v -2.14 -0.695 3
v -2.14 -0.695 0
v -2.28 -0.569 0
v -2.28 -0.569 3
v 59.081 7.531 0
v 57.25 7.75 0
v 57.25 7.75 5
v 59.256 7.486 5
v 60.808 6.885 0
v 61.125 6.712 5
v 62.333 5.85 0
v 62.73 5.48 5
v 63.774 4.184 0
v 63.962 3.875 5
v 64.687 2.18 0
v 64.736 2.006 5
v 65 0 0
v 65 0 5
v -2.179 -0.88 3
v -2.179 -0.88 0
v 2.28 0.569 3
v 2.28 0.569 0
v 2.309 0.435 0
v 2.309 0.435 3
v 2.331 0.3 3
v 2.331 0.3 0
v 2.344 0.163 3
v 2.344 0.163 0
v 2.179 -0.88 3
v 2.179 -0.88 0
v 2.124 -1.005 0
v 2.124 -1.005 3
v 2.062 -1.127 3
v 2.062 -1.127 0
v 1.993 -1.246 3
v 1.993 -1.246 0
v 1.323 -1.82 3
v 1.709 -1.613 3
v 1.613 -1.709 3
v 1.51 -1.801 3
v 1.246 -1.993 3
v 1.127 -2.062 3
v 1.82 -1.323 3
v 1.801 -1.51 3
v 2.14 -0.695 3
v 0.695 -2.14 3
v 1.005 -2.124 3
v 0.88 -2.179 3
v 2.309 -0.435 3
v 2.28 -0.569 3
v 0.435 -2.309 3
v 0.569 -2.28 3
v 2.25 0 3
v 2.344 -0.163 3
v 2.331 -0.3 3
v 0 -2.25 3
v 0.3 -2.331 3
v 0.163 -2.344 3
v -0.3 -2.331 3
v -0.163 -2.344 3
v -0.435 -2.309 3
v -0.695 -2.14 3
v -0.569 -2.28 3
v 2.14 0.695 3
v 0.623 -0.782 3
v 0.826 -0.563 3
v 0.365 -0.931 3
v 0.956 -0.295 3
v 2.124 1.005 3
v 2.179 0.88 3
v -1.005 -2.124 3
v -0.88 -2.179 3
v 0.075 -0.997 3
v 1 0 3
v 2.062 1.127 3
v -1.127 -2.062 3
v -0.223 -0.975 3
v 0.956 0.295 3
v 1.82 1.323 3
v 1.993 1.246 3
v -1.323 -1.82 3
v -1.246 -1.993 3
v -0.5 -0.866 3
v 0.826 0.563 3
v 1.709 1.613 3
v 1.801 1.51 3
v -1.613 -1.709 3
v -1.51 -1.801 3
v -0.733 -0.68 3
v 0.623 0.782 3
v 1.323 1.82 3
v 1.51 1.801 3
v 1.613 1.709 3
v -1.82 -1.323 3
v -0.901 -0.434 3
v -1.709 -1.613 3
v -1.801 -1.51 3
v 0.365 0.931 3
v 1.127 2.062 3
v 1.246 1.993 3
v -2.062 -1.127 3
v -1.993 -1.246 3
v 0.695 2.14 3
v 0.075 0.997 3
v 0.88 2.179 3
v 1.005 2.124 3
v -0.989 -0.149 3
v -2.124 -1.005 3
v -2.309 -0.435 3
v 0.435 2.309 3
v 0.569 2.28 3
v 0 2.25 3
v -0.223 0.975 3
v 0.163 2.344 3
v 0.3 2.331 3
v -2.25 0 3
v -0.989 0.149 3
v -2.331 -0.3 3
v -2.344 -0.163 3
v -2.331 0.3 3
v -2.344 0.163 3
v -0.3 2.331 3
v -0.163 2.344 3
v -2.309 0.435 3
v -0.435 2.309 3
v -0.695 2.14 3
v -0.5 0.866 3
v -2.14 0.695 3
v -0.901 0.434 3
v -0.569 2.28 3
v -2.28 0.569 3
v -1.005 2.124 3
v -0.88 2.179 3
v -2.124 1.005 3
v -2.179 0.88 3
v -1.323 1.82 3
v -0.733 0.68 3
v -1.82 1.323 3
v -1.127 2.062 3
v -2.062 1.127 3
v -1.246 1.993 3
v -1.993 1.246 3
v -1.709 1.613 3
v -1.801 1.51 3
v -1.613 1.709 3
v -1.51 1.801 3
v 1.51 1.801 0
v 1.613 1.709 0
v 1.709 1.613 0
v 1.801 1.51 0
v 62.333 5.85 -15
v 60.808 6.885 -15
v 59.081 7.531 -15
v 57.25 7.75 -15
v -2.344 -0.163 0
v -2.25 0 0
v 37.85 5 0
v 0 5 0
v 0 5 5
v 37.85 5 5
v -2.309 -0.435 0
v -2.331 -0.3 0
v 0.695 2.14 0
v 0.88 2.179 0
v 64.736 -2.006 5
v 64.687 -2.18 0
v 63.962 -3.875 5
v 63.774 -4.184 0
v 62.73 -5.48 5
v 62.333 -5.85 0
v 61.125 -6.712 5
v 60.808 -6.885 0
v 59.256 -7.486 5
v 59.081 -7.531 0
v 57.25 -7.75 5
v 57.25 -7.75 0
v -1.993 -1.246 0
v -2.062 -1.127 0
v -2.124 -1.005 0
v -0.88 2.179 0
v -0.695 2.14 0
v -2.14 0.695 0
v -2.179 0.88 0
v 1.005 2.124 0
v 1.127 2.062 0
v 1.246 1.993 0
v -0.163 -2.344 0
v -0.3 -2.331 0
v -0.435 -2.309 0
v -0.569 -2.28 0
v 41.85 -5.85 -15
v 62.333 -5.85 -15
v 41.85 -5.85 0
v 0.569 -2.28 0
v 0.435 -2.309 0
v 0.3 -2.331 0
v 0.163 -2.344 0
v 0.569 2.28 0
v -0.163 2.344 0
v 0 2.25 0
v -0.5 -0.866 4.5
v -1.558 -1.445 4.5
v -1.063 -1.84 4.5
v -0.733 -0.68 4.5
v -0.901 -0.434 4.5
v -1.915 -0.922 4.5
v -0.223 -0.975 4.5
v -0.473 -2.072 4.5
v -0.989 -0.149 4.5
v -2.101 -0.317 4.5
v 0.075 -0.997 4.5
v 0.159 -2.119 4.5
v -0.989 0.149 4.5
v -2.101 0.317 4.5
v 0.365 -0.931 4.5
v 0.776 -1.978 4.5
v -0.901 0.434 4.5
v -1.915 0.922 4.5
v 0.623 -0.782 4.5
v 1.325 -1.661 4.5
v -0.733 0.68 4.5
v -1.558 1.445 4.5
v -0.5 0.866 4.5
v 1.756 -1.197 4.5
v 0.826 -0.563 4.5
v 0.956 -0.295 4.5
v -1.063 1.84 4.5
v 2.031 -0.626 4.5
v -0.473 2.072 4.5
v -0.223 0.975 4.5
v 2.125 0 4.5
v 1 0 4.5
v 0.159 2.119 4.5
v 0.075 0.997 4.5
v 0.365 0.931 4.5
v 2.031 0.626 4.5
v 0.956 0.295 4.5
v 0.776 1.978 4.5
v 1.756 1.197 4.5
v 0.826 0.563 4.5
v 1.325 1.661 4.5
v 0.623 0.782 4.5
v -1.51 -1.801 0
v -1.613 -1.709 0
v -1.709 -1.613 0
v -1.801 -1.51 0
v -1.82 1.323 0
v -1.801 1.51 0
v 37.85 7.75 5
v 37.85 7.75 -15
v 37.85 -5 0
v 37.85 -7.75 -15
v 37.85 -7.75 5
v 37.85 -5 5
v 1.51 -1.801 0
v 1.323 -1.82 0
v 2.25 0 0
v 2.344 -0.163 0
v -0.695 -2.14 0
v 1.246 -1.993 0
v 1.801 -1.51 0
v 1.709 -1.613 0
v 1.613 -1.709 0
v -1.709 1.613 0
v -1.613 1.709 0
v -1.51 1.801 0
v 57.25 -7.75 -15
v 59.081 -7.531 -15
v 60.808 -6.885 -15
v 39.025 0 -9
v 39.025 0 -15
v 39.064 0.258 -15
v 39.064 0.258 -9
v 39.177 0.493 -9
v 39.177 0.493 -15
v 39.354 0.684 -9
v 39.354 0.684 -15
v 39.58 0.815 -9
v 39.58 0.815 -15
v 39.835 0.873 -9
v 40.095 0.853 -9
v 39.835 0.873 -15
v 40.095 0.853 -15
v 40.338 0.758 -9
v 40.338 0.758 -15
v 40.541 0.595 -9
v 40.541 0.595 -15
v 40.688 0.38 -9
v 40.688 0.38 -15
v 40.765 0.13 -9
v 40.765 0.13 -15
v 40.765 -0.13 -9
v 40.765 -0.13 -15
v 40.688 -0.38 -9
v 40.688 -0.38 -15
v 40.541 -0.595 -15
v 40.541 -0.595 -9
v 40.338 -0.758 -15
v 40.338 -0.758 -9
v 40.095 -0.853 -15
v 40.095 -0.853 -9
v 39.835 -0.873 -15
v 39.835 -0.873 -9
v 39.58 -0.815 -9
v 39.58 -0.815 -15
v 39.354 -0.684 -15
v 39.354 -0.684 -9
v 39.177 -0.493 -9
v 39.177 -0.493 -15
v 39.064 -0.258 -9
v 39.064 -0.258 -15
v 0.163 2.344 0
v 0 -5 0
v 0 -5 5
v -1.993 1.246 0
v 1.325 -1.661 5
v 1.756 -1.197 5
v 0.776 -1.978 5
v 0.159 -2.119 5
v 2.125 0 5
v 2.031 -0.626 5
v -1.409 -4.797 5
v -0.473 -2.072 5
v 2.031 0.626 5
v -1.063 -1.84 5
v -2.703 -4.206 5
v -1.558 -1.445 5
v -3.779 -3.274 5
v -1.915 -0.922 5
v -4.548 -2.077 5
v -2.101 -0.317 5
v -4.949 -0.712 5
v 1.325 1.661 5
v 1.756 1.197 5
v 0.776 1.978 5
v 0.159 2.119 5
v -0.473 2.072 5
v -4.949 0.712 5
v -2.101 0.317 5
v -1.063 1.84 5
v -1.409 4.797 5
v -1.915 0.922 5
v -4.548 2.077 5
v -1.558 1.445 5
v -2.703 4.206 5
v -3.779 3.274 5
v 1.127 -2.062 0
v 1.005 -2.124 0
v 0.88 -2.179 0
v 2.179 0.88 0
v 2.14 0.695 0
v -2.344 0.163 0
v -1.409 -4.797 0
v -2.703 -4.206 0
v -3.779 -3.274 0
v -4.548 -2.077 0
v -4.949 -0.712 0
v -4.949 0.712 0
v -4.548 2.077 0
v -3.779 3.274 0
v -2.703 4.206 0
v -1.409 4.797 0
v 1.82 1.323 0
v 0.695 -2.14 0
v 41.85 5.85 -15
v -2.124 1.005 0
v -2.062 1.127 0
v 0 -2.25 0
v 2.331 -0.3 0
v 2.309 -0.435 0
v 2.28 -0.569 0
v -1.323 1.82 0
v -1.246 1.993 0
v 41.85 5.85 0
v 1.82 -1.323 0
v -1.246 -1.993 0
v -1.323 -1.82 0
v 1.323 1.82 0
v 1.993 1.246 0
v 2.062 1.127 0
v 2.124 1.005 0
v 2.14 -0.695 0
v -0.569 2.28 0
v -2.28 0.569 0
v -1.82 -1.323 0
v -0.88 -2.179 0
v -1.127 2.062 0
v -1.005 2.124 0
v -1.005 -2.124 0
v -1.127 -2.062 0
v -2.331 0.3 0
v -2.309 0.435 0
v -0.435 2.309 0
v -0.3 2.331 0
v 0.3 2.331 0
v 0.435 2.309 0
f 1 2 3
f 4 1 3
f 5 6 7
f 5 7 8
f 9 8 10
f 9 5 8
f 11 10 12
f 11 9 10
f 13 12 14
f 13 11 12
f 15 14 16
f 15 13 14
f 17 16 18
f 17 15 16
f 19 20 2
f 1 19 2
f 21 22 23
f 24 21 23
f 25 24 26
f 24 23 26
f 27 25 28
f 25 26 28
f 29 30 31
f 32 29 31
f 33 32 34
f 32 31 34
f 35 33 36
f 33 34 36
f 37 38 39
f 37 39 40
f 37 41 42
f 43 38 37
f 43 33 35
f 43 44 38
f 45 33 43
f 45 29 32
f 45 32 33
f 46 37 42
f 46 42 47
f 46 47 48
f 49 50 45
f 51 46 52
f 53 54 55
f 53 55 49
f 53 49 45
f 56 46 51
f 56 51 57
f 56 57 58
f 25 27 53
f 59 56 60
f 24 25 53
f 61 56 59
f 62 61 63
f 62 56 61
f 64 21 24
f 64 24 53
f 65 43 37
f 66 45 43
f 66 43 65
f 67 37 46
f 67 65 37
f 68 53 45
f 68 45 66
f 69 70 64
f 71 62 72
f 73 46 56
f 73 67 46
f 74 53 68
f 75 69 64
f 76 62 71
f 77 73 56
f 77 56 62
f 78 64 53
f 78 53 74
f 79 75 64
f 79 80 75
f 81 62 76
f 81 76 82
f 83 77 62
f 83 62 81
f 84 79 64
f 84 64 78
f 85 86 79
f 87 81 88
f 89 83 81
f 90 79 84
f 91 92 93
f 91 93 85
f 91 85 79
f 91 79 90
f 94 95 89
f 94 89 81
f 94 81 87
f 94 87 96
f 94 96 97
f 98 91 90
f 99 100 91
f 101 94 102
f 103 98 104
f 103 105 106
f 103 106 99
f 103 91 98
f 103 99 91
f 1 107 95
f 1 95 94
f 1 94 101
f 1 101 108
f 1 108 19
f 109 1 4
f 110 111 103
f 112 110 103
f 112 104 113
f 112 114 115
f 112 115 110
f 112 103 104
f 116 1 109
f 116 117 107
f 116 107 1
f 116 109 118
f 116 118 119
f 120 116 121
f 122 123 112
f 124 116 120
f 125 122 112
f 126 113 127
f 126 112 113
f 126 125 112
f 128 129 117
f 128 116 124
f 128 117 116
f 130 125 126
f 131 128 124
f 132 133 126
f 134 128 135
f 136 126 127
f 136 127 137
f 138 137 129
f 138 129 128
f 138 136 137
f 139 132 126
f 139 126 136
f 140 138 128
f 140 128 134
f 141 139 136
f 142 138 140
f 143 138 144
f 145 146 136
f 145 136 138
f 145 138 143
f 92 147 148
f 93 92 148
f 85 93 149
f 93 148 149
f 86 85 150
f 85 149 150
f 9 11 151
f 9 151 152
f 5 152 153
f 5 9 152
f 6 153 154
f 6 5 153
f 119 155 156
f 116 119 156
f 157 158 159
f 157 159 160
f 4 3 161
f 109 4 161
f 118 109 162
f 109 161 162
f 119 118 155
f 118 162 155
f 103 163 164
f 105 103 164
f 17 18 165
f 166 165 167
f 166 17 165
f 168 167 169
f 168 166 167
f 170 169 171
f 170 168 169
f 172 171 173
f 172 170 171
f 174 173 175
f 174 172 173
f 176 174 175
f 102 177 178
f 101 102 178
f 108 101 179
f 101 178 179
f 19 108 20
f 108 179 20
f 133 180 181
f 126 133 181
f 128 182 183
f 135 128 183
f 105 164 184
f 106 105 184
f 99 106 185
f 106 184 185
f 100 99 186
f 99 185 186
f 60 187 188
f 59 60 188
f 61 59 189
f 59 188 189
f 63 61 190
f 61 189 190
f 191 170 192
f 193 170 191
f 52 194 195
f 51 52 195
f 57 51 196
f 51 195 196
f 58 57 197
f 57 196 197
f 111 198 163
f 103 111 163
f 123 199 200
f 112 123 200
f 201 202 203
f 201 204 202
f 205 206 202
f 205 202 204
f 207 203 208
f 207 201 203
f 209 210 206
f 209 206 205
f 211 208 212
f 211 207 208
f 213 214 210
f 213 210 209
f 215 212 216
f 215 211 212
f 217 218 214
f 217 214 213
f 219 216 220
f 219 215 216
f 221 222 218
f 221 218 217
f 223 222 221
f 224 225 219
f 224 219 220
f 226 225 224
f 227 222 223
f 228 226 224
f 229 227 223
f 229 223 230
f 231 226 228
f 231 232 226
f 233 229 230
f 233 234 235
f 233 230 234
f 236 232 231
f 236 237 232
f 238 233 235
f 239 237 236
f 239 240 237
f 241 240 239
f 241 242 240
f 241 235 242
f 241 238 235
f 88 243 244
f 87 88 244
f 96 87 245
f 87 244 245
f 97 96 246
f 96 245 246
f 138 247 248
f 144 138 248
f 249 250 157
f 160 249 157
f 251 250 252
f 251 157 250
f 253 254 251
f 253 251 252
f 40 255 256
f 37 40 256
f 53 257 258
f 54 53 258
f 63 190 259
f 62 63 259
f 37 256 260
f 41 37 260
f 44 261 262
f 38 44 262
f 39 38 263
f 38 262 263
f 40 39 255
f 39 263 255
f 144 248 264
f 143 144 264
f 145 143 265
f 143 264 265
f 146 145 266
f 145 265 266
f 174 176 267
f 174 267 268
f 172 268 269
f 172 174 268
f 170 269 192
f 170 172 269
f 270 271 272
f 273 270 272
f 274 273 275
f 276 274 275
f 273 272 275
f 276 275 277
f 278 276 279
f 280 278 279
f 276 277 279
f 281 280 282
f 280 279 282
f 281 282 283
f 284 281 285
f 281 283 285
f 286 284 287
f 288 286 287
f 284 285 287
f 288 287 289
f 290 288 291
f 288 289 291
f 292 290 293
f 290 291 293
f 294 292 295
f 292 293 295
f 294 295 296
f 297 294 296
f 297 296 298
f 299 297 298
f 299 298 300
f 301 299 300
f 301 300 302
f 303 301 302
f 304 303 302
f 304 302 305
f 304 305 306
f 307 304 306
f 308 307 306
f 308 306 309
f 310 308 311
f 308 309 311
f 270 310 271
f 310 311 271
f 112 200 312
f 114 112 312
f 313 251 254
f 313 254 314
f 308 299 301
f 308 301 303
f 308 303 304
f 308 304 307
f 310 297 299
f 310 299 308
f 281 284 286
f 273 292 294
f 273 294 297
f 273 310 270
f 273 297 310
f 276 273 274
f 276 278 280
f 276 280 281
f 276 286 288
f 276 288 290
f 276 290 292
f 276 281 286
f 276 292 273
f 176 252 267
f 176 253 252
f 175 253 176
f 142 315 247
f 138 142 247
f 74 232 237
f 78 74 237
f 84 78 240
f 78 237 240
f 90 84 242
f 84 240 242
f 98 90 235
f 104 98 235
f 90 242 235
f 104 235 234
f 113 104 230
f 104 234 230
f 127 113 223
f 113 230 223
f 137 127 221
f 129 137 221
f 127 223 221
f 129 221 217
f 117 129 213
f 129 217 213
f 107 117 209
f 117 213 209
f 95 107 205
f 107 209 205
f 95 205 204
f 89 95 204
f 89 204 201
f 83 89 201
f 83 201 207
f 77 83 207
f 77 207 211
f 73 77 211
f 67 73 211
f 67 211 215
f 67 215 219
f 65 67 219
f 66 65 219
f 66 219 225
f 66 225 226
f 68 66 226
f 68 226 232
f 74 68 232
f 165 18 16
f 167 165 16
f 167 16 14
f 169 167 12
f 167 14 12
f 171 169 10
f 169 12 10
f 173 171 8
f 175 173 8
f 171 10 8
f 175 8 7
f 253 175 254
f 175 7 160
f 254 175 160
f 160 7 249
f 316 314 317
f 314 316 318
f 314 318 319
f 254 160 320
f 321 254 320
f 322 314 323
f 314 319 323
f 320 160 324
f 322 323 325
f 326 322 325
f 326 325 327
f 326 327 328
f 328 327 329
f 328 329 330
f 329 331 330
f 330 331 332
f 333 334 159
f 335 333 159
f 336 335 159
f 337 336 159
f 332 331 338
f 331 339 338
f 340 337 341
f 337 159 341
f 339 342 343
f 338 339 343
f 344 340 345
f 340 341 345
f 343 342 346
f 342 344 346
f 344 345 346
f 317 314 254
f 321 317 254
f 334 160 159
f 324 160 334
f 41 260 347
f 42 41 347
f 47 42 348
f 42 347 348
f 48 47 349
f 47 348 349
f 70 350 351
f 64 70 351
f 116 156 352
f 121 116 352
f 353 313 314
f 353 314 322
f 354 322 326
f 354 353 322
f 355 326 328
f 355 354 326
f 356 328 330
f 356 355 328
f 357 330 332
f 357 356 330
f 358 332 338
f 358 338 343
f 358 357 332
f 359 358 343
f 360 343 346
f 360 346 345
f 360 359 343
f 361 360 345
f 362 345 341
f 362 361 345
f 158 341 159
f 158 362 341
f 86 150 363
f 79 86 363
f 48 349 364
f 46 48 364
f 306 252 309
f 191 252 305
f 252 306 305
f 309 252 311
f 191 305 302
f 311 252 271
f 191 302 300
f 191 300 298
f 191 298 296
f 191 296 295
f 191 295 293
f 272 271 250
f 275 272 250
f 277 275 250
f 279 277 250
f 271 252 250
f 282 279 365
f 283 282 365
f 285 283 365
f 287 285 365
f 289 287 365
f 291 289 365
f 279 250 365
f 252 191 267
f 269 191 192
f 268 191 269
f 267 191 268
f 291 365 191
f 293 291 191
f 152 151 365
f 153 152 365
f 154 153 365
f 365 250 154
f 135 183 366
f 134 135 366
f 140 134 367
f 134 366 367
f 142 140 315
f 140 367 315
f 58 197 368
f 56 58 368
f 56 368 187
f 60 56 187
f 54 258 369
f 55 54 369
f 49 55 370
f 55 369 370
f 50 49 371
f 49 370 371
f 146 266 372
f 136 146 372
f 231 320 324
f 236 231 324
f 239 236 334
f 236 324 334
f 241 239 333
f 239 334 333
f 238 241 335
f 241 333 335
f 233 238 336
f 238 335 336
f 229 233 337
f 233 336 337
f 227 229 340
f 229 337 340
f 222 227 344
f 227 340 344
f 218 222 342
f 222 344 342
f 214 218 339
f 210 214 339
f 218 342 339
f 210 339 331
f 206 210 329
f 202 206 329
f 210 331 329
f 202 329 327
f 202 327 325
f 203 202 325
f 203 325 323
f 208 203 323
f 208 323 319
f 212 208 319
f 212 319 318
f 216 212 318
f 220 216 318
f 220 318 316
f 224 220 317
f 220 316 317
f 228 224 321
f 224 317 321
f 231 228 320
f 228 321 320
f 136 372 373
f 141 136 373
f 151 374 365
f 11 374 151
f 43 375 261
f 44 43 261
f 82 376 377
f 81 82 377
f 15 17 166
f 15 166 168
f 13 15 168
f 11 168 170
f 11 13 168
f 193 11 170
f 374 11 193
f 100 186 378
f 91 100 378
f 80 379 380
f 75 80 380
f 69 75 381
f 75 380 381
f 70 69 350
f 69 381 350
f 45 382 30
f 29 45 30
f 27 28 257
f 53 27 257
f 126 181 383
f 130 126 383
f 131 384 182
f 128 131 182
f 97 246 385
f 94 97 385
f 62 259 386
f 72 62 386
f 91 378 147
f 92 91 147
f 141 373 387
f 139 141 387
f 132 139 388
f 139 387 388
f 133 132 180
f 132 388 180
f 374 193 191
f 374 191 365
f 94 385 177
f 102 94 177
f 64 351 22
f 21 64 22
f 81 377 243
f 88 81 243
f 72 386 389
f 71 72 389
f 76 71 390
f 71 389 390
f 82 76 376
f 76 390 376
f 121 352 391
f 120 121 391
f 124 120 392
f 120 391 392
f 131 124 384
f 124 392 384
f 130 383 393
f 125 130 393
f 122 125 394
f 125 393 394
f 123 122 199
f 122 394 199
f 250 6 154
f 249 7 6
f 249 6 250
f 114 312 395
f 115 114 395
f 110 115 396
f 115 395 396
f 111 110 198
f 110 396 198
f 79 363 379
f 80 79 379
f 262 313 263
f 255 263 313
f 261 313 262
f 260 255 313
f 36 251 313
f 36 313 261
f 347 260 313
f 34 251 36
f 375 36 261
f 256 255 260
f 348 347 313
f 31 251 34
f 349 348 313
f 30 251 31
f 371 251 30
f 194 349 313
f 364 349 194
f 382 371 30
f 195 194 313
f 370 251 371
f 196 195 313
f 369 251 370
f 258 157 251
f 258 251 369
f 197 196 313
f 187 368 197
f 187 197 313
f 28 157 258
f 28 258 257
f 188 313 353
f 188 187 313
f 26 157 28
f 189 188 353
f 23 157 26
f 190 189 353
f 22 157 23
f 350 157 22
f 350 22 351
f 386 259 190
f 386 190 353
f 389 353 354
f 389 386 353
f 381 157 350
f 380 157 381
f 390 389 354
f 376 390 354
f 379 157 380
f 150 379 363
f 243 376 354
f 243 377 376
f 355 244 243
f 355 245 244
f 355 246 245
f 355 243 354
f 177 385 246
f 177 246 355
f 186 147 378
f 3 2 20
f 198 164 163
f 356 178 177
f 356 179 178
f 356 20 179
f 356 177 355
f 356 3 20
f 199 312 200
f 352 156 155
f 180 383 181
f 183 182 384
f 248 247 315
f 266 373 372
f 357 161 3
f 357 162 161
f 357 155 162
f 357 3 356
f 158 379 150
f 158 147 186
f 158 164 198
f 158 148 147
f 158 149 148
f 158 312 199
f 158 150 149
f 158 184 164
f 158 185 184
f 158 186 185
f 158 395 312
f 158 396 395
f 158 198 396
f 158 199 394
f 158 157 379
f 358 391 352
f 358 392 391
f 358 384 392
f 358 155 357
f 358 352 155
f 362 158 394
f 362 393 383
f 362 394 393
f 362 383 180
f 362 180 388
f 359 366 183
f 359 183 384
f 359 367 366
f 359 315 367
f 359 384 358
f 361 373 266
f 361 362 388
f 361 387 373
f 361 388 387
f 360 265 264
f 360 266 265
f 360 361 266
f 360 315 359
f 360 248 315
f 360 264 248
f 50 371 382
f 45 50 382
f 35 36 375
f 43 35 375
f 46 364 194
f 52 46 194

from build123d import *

# Parameters (mm, degrees)
BOSS_EXTRUDE1_DEPTH = 5
CUT_EXTRUDE1_DEPTH  = 3
SKETCH3_R           = 2.125
CUT_EXTRUDE2_DEPTH  = 0.5
SKETCH4_R           = 1
CUT_EXTRUDE3_DEPTH  = 5.5
BOSS_EXTRUDE2_DEPTH = 5
BOSS_EXTRUDE3_DEPTH = 15
SKETCH10_R          = 0.875
CUT_EXTRUDE6_DEPTH  = 6


with BuildPart() as part:
    # Sketch1 → Boss-Extrude1 (new body)
    with BuildSketch(Plane.XY):
        with BuildLine():
            Line((0, 5), (60, 5))
            ThreePointArc((60, 5), (65, 0), (60, -5))
            Line((60, -5), (0, -5))
            ThreePointArc((0, -5), (-5, 0), (0, 5))
        make_face()
    extrude(amount=BOSS_EXTRUDE1_DEPTH)

    # Sketch2 → Cut-Extrude1 (cut)
    with BuildSketch(Plane(origin=(0, 0, 0), x_dir=(-1, 0, 0), z_dir=(0, 0, -1))):
        with BuildLine():
            Line((2.344315233, -0.163358775), (2.25, 0))
            Line((2.25, 0), (2.344315233, 0.163358775))
            ThreePointArc((2.344315233, 0.163358775), (2.3210676, 0.367620993), (2.280056916, 0.56906982))
            Line((2.280056916, 0.56906982), (2.139877162, 0.695288237))
            Line((2.139877162, 0.695288237), (2.179095641, 0.879796675))
            ThreePointArc((2.179095641, 0.879796675), (2.093865332, 1.066877674), (1.992610742, 1.245793895))
            Line((1.992610742, 1.245793895), (1.820288237, 1.322516818))
            Line((1.820288237, 1.322516818), (1.800570985, 1.510113946))
            ThreePointArc((1.800570985, 1.510113946), (1.661700936, 1.661700936), (1.510113946, 1.800570985))
            Line((1.510113946, 1.800570985), (1.322516818, 1.820288237))
            Line((1.322516818, 1.820288237), (1.245793895, 1.992610742))
            ThreePointArc((1.245793895, 1.992610742), (1.066877674, 2.093865332), (0.879796675, 2.179095641))
            Line((0.879796675, 2.179095641), (0.695288237, 2.139877162))
            Line((0.695288237, 2.139877162), (0.56906982, 2.280056916))
            ThreePointArc((0.56906982, 2.280056916), (0.367620993, 2.3210676), (0.163358775, 2.344315233))
            Line((0.163358775, 2.344315233), (0, 2.25))
            Line((0, 2.25), (-0.163358775, 2.344315233))
            ThreePointArc((-0.163358775, 2.344315233), (-0.367620993, 2.3210676), (-0.56906982, 2.280056916))
            Line((-0.56906982, 2.280056916), (-0.695288237, 2.139877162))
            Line((-0.695288237, 2.139877162), (-0.879796675, 2.179095641))
            ThreePointArc((-0.879796675, 2.179095641), (-1.066877674, 2.093865332), (-1.245793895, 1.992610742))
            Line((-1.245793895, 1.992610742), (-1.322516818, 1.820288237))
            Line((-1.322516818, 1.820288237), (-1.510113946, 1.800570985))
            ThreePointArc((-1.510113946, 1.800570985), (-1.661700936, 1.661700936), (-1.800570985, 1.510113946))
            Line((-1.800570985, 1.510113946), (-1.820288237, 1.322516818))
            Line((-1.820288237, 1.322516818), (-1.992610742, 1.245793895))
            ThreePointArc((-1.992610742, 1.245793895), (-2.093865332, 1.066877674), (-2.179095641, 0.879796675))
            Line((-2.179095641, 0.879796675), (-2.139877162, 0.695288237))
            Line((-2.139877162, 0.695288237), (-2.280056916, 0.56906982))
            ThreePointArc((-2.280056916, 0.56906982), (-2.3210676, 0.367620993), (-2.344315233, 0.163358775))
            Line((-2.344315233, 0.163358775), (-2.25, 0))
            Line((-2.25, 0), (-2.344315233, -0.163358775))
            ThreePointArc((-2.344315233, -0.163358775), (-2.3210676, -0.367620993), (-2.280056916, -0.56906982))
            Line((-2.280056916, -0.56906982), (-2.139877162, -0.695288237))
            Line((-2.139877162, -0.695288237), (-2.179095641, -0.879796675))
            ThreePointArc((-2.179095641, -0.879796675), (-2.093865332, -1.066877674), (-1.992610742, -1.245793895))
            Line((-1.992610742, -1.245793895), (-1.820288237, -1.322516818))
            Line((-1.820288237, -1.322516818), (-1.800570985, -1.510113946))
            ThreePointArc((-1.800570985, -1.510113946), (-1.661700936, -1.661700936), (-1.510113946, -1.800570985))
            Line((-1.510113946, -1.800570985), (-1.322516818, -1.820288237))
            Line((-1.322516818, -1.820288237), (-1.245793895, -1.992610742))
            ThreePointArc((-1.245793895, -1.992610742), (-1.066877674, -2.093865332), (-0.879796675, -2.179095641))
            Line((-0.879796675, -2.179095641), (-0.695288237, -2.139877162))
            Line((-0.695288237, -2.139877162), (-0.56906982, -2.280056916))
            ThreePointArc((-0.56906982, -2.280056916), (-0.367620993, -2.3210676), (-0.163358775, -2.344315233))
            Line((-0.163358775, -2.344315233), (0, -2.25))
            Line((0, -2.25), (0.163358775, -2.344315233))
            ThreePointArc((0.163358775, -2.344315233), (0.367620993, -2.3210676), (0.56906982, -2.280056916))
            Line((0.56906982, -2.280056916), (0.695288237, -2.139877162))
            Line((0.695288237, -2.139877162), (0.879796675, -2.179095641))
            ThreePointArc((0.879796675, -2.179095641), (1.066877674, -2.093865332), (1.245793895, -1.992610742))
            Line((1.245793895, -1.992610742), (1.322516818, -1.820288237))
            Line((1.322516818, -1.820288237), (1.510113946, -1.800570985))
            ThreePointArc((1.510113946, -1.800570985), (1.661700936, -1.661700936), (1.800570985, -1.510113946))
            Line((1.800570985, -1.510113946), (1.820288237, -1.322516818))
            Line((1.820288237, -1.322516818), (1.992610742, -1.245793895))
            ThreePointArc((1.992610742, -1.245793895), (2.093865332, -1.066877674), (2.179095641, -0.879796675))
            Line((2.179095641, -0.879796675), (2.139877162, -0.695288237))
            Line((2.139877162, -0.695288237), (2.280056916, -0.56906982))
            ThreePointArc((2.280056916, -0.56906982), (2.3210676, -0.367620993), (2.344315233, -0.163358775))
        make_face()
    extrude(amount=-CUT_EXTRUDE1_DEPTH, mode=Mode.SUBTRACT)

    # Sketch3 → Cut-Extrude2 (cut)
    with BuildSketch(Plane.XY.offset(5)):
        Circle(SKETCH3_R)
    extrude(amount=-CUT_EXTRUDE2_DEPTH, mode=Mode.SUBTRACT)

    # Sketch4 → Cut-Extrude3 (cut, through all)
    with BuildSketch(Plane.XY.offset(4.5)):
        Circle(SKETCH4_R)
    extrude(amount=-CUT_EXTRUDE3_DEPTH, mode=Mode.SUBTRACT)

    # Sketch5 → Boss-Extrude2 (add)
    with BuildSketch(Plane(origin=(0, 0, 0), x_dir=(-1, 0, 0), z_dir=(0, 0, -1))):
        with BuildLine():
            Line((-60, 5), (-37.85, 5))
            Line((-37.85, 5), (-37.85, 7.75))
            Line((-37.85, 7.75), (-57.25, 7.75))
            ThreePointArc((-57.25, 7.75), (-62.730077554, 5.480077554), (-65, 0))
            ThreePointArc((-65, 0), (-63.535533906, 3.535533906), (-60, 5))
        make_face()
        with BuildLine():
            ThreePointArc((-60, -5), (-63.535533906, -3.535533906), (-65, 0))
            ThreePointArc((-65, 0), (-62.730077554, -5.480077554), (-57.25, -7.75))
            Line((-57.25, -7.75), (-37.85, -7.75))
            Line((-37.85, -7.75), (-37.85, -5))
            Line((-37.85, -5), (-60, -5))
        make_face()
    extrude(amount=-BOSS_EXTRUDE2_DEPTH)

    # Sketch6 → Boss-Extrude3 (add)
    with BuildSketch(Plane(origin=(0, 0, 0), x_dir=(-1, 0, 0), z_dir=(0, 0, -1))):
        with BuildLine():
            Line((-62.333306011, -5.85), (-41.85, -5.85))
            Line((-41.85, -5.85), (-41.85, 5.85))
            Line((-41.85, 5.85), (-62.333306011, 5.85))
            ThreePointArc((-62.333306011, 5.85), (-59.96339271, 7.259476565), (-57.25, 7.75))
            Line((-57.25, 7.75), (-37.85, 7.75))
            Line((-37.85, 7.75), (-37.85, 5))
            Line((-37.85, 5), (-37.85, -5))
            Line((-37.85, -5), (-37.85, -7.75))
            Line((-37.85, -7.75), (-57.25, -7.75))
            ThreePointArc((-57.25, -7.75), (-59.96339271, -7.259476565), (-62.333306011, -5.85))
        make_face()
    extrude(amount=BOSS_EXTRUDE3_DEPTH)

    # Sketch10 → Cut-Extrude6 (cut)
    with BuildSketch(Plane(origin=(0, 0, -15), x_dir=(-1, 0, 0), z_dir=(0, 0, -1))):
        with Locations((-39.9, 0)):
            Circle(SKETCH10_R)
    extrude(amount=-CUT_EXTRUDE6_DEPTH, mode=Mode.SUBTRACT)


solid = part.part
